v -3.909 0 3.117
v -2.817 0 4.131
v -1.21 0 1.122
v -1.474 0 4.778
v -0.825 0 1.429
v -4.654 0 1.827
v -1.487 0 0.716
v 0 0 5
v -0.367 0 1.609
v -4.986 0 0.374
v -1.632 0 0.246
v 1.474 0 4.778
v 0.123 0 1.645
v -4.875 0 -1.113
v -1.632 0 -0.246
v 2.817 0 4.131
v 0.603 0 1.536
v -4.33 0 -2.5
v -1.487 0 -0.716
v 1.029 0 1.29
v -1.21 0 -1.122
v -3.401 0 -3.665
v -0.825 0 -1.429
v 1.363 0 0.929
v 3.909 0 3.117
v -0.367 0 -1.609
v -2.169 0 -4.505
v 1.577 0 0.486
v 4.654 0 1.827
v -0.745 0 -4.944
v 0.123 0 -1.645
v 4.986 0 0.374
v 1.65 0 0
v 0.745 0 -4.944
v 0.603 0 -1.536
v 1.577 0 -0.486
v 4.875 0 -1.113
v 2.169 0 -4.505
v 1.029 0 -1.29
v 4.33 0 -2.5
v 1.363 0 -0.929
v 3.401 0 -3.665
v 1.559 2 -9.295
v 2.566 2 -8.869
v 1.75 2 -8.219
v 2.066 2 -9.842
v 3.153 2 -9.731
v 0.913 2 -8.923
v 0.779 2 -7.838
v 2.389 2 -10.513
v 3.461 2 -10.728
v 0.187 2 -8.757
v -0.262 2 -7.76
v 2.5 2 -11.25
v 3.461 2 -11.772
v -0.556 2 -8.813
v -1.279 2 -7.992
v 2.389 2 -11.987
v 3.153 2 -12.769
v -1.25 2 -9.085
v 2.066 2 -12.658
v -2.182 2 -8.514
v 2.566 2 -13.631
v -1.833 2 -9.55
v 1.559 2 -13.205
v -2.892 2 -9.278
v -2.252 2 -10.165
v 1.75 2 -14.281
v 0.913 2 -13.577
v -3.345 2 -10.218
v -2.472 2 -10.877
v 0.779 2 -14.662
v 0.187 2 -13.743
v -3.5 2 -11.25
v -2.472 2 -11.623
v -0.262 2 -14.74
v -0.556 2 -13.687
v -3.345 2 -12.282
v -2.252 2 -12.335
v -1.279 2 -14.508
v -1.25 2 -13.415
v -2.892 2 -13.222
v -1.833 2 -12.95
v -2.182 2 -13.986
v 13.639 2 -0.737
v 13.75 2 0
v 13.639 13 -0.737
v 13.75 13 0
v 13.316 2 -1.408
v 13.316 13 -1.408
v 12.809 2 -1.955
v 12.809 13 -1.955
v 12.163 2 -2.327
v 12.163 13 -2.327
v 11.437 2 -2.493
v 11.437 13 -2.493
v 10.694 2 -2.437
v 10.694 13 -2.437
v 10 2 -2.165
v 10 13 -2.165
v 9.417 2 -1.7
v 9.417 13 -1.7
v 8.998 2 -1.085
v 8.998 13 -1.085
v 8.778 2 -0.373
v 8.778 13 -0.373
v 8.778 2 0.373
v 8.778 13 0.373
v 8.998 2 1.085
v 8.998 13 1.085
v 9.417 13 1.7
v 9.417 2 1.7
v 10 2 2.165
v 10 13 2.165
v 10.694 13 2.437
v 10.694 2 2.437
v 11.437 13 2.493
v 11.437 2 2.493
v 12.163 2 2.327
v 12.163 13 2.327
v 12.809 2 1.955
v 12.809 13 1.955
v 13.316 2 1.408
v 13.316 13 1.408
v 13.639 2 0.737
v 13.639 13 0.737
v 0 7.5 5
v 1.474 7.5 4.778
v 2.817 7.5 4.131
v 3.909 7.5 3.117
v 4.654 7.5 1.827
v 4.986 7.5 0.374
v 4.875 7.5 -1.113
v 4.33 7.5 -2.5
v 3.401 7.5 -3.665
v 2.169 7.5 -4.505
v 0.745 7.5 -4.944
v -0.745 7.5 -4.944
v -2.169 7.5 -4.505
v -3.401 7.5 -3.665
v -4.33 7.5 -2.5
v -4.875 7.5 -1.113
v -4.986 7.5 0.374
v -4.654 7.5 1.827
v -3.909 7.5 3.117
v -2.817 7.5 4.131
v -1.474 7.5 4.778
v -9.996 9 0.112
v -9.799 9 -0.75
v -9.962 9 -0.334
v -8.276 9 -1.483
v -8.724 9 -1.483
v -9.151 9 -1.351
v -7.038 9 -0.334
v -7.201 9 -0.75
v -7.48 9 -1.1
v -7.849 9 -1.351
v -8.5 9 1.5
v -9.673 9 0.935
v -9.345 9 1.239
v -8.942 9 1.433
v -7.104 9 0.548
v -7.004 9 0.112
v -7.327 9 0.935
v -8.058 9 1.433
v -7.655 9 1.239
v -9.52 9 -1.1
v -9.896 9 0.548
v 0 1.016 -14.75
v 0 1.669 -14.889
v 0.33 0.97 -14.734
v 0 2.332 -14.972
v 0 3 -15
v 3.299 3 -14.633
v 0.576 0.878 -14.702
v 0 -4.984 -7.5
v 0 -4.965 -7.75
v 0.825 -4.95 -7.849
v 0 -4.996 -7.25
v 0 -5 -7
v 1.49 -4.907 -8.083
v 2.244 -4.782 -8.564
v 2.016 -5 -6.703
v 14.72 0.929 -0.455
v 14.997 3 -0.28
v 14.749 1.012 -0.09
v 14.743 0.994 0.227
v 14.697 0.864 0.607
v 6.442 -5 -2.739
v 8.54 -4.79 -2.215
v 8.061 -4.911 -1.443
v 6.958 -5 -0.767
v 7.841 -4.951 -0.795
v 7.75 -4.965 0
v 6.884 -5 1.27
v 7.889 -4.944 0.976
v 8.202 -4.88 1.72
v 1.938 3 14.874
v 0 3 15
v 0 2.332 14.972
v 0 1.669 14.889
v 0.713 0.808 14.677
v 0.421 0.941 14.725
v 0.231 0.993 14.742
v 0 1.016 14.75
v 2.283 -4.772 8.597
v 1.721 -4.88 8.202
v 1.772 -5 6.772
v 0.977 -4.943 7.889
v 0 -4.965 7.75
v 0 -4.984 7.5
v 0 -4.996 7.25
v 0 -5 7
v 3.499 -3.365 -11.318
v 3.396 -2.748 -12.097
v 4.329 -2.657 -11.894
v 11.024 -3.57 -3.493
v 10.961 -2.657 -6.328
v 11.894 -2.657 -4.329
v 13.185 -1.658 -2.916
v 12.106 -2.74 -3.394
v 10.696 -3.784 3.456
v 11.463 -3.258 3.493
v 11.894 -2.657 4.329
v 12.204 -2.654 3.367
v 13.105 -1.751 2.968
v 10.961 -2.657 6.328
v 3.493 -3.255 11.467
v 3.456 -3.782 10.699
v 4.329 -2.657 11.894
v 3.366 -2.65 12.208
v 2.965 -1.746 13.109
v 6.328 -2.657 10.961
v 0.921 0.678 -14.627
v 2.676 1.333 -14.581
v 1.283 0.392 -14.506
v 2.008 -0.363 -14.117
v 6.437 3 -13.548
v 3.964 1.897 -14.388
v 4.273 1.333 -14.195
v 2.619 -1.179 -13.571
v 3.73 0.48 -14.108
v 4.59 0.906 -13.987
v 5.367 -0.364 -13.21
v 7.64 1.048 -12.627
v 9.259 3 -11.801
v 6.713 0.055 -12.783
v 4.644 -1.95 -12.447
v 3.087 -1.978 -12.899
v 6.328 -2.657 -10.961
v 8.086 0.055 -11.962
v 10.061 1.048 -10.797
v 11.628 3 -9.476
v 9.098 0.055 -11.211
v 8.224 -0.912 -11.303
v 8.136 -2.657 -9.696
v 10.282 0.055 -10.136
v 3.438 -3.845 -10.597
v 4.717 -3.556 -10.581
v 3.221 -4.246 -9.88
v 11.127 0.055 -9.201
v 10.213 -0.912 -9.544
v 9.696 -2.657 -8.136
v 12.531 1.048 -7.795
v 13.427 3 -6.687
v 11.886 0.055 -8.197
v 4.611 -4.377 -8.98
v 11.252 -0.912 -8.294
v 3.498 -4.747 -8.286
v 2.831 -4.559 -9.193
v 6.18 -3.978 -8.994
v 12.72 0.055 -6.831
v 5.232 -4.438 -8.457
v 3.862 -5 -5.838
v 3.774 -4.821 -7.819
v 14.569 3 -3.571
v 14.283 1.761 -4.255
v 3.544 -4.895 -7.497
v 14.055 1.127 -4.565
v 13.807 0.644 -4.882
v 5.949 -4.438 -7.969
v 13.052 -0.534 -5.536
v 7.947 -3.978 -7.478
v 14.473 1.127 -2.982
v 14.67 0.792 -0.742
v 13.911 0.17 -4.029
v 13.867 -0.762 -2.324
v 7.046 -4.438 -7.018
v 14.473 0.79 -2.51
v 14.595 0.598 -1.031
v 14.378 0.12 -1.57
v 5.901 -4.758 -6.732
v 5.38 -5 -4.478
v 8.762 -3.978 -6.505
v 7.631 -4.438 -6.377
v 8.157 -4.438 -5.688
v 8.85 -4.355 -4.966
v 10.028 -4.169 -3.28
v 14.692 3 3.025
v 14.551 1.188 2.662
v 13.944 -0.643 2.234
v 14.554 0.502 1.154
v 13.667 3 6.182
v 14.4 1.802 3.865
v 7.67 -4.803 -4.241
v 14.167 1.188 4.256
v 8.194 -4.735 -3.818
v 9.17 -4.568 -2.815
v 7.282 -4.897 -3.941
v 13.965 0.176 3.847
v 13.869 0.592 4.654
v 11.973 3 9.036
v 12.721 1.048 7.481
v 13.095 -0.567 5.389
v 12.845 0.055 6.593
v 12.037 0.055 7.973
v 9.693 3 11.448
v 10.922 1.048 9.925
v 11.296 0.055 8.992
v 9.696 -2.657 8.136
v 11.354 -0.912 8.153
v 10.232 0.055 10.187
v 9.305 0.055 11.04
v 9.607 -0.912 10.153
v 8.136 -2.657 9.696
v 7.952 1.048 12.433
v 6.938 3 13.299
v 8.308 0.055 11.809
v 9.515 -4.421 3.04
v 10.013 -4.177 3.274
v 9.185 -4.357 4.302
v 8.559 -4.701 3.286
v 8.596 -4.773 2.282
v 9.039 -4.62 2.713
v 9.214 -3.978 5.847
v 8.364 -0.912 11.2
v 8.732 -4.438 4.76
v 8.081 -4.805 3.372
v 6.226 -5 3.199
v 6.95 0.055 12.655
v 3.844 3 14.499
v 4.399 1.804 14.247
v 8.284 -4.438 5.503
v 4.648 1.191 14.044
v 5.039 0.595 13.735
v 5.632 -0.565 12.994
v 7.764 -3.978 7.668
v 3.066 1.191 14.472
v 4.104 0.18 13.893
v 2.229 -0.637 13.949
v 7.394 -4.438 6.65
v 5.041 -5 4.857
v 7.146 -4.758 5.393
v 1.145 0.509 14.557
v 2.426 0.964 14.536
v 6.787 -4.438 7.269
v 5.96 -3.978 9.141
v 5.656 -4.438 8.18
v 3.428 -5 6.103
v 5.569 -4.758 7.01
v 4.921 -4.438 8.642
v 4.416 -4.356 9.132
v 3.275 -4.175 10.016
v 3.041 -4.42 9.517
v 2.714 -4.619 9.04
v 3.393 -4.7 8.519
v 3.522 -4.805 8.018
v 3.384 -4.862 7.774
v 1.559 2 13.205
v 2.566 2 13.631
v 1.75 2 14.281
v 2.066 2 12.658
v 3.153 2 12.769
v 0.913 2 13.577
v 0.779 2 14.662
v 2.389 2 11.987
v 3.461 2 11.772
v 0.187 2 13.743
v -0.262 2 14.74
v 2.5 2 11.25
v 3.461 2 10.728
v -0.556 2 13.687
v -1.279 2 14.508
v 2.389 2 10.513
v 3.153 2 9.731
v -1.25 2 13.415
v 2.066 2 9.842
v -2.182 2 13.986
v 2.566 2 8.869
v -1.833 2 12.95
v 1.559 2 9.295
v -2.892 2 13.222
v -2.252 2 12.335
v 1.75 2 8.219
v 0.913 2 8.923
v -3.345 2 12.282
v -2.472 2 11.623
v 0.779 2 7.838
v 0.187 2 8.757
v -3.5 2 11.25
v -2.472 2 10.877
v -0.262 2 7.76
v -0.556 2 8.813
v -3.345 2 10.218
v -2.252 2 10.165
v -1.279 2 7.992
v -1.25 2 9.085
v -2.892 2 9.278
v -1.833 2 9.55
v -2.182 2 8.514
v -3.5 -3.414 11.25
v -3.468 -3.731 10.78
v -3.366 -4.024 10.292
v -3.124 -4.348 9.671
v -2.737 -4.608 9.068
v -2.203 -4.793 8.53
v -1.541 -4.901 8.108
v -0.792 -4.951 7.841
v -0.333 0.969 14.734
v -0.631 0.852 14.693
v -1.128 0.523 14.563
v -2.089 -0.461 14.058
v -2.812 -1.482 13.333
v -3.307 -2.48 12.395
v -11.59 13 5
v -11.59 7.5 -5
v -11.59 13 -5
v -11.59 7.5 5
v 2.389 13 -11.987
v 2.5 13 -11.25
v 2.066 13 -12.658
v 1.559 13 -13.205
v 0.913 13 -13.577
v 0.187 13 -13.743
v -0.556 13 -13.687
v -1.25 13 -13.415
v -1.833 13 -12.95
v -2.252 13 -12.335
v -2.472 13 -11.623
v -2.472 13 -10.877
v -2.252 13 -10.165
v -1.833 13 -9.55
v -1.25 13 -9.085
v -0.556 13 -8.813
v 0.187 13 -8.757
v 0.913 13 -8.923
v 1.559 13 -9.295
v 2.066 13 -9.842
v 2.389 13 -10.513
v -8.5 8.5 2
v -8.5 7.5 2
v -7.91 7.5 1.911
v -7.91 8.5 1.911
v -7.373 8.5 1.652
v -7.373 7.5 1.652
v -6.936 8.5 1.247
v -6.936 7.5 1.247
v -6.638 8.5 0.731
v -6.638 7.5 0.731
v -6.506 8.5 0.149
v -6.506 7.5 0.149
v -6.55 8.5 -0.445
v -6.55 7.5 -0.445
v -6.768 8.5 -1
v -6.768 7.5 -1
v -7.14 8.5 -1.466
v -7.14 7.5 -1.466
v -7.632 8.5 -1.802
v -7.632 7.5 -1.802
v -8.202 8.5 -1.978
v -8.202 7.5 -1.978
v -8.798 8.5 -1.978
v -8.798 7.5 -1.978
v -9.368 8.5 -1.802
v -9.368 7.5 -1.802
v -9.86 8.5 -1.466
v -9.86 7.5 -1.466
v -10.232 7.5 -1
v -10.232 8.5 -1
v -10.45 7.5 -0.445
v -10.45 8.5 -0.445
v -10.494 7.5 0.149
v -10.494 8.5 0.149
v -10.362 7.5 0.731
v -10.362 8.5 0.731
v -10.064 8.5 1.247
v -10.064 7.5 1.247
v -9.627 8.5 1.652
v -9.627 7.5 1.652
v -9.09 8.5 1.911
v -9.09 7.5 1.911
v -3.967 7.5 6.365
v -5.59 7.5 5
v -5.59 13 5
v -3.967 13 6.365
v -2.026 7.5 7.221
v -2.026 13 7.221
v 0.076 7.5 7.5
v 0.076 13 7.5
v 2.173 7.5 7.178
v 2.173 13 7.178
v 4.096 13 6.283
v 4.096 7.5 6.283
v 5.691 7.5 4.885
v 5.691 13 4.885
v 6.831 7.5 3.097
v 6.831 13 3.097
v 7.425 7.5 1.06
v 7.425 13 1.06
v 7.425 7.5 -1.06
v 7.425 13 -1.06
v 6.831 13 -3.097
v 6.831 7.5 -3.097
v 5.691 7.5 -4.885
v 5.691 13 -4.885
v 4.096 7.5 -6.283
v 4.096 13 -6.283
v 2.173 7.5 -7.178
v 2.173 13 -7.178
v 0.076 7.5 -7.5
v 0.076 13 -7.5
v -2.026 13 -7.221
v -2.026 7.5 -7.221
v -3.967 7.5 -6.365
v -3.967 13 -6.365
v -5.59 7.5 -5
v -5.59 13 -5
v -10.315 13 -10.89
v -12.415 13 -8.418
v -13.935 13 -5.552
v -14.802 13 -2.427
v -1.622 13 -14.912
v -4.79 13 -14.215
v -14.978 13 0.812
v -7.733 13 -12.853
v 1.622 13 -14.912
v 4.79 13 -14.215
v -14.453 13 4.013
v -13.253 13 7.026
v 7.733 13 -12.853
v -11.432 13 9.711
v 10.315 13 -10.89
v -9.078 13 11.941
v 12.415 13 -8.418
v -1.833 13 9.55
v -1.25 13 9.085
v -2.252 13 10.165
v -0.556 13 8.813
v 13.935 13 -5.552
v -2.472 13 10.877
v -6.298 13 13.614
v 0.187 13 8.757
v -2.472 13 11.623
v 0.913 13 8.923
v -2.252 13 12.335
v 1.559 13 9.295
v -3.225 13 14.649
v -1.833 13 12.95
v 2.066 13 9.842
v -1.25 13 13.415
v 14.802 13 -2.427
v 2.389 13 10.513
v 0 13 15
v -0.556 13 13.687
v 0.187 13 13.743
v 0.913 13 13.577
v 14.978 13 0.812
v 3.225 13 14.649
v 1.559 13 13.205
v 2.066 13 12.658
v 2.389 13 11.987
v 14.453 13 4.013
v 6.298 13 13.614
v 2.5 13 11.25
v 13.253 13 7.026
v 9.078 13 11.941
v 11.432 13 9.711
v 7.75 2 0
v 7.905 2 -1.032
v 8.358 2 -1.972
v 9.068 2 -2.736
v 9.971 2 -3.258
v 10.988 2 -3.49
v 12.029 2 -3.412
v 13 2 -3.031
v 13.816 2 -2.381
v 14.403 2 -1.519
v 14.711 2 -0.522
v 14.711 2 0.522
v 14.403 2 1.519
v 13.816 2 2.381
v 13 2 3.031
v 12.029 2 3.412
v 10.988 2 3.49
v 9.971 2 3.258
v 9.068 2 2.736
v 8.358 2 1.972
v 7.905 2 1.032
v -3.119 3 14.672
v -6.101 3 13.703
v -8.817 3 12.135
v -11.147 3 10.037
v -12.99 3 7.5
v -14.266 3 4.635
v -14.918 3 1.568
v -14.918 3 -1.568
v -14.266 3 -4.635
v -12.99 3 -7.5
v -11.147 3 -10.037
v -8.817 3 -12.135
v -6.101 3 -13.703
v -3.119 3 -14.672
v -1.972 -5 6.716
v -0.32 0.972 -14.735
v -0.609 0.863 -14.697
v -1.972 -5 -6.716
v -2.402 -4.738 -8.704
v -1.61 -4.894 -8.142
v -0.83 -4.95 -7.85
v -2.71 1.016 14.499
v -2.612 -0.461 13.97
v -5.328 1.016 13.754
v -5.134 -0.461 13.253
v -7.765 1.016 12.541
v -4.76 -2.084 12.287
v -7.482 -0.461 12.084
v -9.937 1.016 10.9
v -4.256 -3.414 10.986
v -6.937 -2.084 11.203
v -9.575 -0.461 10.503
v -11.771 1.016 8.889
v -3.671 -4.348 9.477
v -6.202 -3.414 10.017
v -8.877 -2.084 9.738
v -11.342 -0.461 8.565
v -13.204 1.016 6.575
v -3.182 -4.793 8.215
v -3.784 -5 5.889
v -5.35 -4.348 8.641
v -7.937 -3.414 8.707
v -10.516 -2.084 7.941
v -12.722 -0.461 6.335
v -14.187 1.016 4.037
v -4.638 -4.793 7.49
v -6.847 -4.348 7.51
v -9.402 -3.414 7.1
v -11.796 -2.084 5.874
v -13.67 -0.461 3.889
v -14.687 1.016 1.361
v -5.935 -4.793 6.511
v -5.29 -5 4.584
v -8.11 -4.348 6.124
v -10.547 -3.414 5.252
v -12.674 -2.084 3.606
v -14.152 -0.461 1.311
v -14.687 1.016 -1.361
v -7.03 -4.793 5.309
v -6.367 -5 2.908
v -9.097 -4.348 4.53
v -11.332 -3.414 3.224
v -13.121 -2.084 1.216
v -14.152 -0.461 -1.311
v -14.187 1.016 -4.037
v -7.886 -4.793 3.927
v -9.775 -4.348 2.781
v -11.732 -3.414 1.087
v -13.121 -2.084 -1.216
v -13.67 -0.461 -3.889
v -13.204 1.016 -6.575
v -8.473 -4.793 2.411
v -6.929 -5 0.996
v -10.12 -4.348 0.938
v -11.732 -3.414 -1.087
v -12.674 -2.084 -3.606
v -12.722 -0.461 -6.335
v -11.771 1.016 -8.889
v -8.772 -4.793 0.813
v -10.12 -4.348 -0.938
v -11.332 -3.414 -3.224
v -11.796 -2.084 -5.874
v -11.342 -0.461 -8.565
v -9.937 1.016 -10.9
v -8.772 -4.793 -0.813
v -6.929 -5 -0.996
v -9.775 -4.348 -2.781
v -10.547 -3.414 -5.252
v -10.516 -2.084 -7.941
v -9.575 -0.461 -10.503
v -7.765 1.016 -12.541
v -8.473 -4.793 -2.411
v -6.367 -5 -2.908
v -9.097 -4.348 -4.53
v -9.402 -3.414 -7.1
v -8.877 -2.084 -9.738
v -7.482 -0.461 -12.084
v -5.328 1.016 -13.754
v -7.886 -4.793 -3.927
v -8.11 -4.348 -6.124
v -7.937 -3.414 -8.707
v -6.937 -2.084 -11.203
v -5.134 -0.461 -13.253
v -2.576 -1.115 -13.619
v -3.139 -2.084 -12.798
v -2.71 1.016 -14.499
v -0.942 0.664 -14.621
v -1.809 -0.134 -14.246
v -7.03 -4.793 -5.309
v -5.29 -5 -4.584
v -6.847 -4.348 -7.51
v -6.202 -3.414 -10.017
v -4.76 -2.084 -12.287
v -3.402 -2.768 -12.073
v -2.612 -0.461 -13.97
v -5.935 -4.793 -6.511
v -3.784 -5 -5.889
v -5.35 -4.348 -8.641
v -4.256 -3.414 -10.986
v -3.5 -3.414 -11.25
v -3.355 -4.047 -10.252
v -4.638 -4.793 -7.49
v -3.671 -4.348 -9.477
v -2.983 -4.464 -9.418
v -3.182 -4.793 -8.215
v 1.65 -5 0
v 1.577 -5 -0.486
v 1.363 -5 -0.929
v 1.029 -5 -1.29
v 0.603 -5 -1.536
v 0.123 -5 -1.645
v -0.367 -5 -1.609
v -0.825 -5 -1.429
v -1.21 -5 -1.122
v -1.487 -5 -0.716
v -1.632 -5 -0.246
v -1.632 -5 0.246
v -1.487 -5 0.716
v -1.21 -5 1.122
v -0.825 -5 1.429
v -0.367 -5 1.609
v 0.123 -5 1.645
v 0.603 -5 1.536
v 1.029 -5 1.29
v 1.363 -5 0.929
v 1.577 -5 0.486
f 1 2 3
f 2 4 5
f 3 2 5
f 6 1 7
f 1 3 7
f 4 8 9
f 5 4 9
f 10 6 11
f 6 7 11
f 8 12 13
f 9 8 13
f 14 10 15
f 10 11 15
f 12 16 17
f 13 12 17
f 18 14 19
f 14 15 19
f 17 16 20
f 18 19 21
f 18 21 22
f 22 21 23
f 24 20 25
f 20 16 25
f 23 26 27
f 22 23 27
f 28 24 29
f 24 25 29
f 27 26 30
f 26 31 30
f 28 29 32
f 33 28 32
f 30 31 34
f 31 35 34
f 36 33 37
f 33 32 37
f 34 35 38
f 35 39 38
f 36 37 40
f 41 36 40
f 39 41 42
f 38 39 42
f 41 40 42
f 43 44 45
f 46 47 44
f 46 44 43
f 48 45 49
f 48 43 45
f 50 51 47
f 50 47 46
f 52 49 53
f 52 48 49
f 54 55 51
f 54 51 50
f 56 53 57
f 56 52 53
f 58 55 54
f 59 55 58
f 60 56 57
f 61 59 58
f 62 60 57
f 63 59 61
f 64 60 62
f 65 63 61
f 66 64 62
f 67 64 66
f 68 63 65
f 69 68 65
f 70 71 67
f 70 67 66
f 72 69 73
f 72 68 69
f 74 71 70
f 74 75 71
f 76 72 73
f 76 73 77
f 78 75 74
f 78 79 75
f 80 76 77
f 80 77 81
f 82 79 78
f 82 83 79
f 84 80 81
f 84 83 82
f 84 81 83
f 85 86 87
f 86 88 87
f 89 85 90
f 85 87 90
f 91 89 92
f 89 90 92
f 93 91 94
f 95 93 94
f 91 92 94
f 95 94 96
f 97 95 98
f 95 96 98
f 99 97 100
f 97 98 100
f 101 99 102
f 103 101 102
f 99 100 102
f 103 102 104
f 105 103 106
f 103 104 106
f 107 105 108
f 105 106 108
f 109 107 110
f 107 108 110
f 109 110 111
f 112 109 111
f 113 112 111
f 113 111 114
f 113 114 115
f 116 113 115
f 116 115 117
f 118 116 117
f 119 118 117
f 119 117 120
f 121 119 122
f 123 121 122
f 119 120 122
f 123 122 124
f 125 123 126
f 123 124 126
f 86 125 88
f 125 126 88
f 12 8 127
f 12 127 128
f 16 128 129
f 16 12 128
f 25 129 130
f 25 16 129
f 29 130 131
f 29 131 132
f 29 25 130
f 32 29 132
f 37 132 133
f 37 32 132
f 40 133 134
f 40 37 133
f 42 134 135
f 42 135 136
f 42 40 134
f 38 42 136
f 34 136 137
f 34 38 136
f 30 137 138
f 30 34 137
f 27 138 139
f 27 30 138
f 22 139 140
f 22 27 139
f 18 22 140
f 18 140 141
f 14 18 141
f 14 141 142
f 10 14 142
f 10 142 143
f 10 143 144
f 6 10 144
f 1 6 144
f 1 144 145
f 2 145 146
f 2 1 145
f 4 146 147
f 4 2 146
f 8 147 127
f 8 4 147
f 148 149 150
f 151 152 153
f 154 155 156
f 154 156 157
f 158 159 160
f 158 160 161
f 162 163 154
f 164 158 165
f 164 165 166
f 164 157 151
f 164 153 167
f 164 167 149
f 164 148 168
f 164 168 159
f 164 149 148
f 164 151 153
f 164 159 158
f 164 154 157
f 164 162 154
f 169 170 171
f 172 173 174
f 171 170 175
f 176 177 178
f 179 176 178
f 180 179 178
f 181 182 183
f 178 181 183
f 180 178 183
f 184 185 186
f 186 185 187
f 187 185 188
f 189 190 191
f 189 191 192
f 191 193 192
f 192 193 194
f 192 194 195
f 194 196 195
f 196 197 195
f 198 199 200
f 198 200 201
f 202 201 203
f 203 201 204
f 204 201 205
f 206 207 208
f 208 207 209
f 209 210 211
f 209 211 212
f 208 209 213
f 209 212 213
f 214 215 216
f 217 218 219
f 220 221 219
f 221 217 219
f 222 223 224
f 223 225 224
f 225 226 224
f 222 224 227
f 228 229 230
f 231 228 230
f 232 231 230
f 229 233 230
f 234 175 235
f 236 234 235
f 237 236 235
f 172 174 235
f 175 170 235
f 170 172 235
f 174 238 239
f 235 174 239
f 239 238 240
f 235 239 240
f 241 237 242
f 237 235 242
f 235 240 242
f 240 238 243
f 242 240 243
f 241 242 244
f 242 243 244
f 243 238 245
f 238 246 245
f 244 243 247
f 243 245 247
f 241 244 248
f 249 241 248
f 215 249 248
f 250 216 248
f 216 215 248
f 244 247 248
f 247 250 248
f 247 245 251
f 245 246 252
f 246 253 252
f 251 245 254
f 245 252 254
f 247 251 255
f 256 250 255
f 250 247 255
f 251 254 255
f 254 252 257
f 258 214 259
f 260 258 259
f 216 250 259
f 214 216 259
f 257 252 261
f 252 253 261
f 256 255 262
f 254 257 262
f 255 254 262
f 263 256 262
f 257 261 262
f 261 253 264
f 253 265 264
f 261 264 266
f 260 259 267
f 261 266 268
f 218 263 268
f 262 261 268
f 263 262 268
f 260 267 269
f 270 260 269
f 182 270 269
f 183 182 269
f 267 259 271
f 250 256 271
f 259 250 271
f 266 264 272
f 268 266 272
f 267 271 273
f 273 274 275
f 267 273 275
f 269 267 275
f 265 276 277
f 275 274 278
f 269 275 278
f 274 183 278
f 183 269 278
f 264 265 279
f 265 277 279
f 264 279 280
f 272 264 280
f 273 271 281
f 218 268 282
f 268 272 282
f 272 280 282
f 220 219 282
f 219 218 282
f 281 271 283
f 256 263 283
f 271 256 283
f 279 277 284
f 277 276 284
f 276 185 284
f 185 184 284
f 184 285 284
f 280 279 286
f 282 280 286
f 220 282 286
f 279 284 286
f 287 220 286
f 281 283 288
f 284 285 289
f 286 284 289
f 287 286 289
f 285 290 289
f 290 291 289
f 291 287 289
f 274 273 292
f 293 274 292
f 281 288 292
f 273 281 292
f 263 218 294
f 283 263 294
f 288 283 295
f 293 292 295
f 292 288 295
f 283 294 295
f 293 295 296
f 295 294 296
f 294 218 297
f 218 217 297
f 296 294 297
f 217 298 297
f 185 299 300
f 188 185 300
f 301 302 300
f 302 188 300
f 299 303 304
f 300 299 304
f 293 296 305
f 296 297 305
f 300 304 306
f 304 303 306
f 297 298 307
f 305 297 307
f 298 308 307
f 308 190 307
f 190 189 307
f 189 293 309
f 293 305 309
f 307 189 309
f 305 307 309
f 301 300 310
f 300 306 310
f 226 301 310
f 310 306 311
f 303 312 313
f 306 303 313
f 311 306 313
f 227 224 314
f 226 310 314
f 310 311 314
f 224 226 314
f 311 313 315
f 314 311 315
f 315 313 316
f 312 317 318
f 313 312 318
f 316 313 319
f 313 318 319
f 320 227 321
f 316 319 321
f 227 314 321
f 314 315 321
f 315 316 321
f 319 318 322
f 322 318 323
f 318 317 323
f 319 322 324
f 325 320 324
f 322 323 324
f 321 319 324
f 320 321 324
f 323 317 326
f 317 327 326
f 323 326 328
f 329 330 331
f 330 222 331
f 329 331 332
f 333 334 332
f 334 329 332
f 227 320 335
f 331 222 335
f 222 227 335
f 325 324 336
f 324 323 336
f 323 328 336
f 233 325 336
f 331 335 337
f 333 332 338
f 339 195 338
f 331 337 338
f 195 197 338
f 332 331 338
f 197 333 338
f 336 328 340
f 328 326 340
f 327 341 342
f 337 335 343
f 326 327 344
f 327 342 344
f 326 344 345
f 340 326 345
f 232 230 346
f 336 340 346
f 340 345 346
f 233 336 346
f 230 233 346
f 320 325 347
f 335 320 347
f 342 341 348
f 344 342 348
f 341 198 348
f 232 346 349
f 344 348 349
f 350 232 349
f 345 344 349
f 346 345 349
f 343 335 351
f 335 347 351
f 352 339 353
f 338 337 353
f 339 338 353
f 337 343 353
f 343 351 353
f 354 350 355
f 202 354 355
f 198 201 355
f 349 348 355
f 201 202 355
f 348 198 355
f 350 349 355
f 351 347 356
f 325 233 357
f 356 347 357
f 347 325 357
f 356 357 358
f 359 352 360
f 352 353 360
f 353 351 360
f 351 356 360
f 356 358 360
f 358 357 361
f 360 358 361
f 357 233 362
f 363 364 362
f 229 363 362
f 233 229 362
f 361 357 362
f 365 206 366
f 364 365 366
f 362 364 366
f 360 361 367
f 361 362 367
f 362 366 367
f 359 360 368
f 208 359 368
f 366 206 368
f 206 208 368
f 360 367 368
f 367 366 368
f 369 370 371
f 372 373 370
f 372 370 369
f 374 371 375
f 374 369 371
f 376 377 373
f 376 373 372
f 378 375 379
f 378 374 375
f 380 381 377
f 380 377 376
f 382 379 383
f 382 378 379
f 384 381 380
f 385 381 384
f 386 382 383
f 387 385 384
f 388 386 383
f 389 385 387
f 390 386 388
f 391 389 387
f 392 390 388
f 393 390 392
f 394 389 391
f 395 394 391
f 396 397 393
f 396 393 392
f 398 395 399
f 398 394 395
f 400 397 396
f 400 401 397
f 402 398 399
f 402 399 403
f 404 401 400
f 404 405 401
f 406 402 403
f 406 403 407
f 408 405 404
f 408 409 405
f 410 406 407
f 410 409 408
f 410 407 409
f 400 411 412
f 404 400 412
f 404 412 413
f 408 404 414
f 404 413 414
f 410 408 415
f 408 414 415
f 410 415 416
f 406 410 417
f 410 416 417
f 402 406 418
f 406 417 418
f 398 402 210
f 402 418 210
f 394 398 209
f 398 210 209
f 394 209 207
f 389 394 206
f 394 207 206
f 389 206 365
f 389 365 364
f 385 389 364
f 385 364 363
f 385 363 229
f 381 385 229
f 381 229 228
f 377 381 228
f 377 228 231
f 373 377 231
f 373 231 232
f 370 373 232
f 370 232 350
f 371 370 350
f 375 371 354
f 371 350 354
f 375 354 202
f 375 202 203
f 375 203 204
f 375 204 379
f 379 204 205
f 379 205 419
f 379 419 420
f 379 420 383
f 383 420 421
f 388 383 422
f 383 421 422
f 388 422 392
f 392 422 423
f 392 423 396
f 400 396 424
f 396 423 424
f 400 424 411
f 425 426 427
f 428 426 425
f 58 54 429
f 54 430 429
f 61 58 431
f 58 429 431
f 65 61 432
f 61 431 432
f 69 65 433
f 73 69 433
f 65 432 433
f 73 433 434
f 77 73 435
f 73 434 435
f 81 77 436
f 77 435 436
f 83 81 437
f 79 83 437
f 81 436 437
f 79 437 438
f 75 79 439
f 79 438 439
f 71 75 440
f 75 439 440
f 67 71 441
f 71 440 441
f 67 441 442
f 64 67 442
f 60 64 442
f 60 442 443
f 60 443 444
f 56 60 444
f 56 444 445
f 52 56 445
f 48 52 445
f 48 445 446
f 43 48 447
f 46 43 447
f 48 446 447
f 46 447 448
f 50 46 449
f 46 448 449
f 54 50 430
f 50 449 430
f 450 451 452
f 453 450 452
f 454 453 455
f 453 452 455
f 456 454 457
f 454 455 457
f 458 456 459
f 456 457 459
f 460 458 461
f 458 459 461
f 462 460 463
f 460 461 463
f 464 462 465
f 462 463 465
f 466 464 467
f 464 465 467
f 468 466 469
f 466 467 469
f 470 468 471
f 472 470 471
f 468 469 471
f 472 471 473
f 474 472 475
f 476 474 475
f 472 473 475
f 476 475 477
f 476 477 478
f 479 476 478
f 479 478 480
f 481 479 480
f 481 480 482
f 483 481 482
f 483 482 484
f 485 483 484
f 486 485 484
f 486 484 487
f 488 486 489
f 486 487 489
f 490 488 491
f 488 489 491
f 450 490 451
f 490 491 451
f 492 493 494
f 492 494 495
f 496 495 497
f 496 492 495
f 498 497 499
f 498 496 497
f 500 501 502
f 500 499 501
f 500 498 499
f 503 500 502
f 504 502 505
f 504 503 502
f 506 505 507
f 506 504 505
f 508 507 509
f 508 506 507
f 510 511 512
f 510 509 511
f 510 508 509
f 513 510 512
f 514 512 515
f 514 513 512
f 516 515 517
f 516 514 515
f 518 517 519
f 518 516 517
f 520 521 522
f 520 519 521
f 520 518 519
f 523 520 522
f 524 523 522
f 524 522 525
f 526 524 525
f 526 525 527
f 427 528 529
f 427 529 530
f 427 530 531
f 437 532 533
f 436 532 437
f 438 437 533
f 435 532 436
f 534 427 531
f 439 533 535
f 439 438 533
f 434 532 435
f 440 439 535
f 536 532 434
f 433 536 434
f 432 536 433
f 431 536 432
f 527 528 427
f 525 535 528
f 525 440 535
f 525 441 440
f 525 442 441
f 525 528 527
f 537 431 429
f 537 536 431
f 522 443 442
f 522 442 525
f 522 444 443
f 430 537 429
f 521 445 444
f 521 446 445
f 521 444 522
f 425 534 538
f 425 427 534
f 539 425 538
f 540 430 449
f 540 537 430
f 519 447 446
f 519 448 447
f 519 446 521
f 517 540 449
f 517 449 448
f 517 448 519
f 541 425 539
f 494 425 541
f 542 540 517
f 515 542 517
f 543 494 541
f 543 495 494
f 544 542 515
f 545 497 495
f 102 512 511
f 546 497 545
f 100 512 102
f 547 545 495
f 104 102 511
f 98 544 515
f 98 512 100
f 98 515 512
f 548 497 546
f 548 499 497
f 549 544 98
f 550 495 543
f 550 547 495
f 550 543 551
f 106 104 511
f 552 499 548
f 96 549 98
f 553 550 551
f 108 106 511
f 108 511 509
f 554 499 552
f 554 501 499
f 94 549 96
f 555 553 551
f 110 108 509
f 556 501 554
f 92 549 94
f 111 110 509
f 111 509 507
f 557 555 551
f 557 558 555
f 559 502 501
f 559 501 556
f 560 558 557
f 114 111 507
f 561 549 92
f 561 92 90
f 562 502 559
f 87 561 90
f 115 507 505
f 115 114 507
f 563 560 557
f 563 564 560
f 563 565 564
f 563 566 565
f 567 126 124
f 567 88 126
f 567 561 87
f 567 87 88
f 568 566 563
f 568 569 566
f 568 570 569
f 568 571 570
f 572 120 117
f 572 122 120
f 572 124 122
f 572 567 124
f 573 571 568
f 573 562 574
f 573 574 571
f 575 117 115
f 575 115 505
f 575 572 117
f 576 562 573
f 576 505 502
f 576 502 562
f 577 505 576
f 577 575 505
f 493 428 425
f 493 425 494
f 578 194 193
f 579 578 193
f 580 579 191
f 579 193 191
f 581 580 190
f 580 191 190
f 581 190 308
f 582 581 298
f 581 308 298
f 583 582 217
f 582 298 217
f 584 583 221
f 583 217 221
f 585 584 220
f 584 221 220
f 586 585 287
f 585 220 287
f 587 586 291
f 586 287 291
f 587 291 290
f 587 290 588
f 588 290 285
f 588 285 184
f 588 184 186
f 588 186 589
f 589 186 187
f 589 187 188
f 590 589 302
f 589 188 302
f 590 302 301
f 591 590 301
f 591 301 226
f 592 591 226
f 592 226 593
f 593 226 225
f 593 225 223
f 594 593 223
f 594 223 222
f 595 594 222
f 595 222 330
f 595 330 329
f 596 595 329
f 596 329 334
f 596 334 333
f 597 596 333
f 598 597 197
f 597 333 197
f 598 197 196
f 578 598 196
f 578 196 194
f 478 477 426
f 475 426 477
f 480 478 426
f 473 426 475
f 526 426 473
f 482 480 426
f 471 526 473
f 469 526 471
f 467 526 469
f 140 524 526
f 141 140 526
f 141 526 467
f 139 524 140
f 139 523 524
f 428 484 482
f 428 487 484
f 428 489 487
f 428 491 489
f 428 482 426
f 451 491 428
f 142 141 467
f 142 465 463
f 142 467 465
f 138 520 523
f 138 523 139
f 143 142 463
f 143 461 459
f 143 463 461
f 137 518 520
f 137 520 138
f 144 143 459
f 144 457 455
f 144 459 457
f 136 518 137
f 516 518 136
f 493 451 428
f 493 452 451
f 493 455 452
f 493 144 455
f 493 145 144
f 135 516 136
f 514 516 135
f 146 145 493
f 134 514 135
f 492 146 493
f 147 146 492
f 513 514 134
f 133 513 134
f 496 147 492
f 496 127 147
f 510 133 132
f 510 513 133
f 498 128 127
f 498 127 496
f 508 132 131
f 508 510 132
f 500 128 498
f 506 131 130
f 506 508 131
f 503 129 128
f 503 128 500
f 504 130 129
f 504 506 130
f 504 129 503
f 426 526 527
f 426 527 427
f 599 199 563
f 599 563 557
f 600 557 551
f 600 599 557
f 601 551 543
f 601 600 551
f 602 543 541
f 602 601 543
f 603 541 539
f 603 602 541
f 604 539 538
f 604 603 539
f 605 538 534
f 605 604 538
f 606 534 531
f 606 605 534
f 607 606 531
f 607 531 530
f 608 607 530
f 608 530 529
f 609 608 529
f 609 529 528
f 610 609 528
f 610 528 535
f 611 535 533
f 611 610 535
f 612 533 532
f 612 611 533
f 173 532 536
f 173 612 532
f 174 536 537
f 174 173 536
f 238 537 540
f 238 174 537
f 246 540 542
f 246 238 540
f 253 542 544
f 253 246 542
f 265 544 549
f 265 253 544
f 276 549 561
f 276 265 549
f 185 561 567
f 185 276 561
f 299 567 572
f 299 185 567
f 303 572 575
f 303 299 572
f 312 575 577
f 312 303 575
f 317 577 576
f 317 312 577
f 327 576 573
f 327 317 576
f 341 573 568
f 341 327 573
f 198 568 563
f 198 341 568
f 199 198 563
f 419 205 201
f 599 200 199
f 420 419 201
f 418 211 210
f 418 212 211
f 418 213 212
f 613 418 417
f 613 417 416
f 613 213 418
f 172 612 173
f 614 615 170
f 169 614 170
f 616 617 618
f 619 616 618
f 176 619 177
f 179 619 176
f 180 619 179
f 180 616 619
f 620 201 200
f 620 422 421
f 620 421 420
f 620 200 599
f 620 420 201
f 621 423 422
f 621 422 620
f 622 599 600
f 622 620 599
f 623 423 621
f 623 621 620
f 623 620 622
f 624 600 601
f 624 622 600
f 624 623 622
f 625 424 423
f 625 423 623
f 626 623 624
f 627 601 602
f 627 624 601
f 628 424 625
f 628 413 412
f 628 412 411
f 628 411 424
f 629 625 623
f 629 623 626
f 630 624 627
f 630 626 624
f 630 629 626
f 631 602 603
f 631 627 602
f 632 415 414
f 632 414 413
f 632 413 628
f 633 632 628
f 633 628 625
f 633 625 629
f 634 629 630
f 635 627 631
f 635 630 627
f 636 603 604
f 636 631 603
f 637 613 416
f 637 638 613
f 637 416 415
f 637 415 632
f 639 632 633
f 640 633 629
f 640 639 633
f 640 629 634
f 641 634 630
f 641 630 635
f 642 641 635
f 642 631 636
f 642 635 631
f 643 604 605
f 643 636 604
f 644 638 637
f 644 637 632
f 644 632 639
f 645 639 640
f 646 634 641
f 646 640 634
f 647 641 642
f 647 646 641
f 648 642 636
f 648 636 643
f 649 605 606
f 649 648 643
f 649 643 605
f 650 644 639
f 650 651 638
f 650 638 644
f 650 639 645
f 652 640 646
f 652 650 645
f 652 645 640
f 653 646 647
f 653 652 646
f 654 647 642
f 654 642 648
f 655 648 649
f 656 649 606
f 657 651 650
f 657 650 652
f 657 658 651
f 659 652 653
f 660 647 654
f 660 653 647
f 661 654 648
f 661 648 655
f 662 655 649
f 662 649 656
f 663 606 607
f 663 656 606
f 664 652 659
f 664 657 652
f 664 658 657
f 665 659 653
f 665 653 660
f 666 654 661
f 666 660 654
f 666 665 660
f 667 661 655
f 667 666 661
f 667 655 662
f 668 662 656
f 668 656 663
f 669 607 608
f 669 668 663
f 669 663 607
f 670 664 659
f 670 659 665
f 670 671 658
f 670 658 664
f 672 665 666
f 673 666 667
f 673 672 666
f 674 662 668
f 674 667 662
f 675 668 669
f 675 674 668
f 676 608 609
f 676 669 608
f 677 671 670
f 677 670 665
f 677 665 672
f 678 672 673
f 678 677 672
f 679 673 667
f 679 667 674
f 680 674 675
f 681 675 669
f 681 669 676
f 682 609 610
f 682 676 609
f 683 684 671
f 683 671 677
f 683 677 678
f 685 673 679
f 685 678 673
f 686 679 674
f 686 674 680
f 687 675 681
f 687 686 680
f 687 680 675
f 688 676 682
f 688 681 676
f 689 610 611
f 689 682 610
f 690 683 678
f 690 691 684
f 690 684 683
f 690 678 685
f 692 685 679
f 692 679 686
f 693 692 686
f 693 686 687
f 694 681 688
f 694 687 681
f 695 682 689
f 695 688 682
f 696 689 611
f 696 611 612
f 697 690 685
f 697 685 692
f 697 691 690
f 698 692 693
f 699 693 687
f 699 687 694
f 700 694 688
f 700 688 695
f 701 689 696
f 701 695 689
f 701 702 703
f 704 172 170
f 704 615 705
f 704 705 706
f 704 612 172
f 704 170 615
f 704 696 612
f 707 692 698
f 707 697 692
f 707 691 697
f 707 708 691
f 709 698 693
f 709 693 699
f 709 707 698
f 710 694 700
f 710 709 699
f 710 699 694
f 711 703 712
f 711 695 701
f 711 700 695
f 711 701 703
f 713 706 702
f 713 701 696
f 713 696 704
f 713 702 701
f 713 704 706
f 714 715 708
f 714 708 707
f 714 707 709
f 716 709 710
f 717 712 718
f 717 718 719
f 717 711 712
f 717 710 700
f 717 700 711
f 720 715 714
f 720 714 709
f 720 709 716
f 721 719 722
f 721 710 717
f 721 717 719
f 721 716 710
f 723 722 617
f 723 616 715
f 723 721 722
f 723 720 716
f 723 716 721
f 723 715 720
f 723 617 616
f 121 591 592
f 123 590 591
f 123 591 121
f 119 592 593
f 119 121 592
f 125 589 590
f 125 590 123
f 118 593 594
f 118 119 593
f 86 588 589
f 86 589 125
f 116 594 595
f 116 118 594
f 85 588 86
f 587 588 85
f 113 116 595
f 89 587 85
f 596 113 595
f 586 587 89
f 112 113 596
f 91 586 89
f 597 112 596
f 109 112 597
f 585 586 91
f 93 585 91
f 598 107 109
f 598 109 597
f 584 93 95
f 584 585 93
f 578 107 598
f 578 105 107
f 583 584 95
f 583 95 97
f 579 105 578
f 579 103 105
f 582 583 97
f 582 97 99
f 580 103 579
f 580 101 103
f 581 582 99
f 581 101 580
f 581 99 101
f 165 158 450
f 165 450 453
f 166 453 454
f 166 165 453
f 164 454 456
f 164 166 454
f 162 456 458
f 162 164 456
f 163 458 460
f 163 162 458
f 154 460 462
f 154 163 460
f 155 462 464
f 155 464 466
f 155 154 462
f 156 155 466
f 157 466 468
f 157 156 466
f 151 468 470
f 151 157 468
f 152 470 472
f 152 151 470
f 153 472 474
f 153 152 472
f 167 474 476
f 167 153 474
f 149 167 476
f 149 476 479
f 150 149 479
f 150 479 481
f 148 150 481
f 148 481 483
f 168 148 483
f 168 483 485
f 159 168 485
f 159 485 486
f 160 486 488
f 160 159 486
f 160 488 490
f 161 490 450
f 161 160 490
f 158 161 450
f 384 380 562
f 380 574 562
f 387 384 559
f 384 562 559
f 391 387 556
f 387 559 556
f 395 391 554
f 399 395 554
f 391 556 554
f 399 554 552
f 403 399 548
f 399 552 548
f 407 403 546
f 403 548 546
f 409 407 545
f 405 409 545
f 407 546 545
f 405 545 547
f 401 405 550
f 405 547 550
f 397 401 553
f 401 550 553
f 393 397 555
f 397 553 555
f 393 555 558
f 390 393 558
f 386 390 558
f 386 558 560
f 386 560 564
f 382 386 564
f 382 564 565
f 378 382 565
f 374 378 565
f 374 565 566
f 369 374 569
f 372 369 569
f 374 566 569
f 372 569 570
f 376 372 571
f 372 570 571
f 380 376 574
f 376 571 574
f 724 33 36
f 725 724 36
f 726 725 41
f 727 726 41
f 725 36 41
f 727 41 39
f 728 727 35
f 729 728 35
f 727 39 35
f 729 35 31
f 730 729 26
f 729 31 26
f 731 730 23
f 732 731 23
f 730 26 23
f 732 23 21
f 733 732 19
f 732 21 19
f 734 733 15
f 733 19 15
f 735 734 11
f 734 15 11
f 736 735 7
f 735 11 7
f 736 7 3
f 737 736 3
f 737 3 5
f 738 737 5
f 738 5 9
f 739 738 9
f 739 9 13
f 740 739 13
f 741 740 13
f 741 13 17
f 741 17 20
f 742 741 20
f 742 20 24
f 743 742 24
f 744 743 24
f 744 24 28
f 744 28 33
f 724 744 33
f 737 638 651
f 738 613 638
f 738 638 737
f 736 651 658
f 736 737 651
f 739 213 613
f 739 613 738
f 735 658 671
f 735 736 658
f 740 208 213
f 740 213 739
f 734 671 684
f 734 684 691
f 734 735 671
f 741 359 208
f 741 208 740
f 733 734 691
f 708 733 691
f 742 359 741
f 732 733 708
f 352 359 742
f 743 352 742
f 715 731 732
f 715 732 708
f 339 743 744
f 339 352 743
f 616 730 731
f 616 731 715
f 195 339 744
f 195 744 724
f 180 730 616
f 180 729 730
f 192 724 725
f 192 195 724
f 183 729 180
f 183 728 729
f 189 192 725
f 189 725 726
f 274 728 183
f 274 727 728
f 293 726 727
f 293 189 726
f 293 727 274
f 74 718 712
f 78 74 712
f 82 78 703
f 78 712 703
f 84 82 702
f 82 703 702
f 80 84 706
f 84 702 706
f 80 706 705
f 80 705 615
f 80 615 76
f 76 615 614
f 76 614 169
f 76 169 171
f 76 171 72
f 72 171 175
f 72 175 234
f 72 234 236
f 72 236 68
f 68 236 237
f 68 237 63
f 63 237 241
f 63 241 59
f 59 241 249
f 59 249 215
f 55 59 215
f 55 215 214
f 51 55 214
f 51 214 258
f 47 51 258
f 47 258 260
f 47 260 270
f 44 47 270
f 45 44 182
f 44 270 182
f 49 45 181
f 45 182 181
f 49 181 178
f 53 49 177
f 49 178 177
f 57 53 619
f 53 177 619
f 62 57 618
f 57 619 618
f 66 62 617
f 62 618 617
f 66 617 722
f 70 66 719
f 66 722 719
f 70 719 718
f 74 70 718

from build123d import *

# Parameters (mm, degrees)
SKETCH1_R             = 15
SKETCH1_R_2           = 5
BOSS_EXTRUDE1_DEPTH   = 7.5
SKETCH2_R             = 15
SKETCH2_R_2           = 7.5
BOSS_EXTRUDE2_DEPTH   = 5.5
BOSS_EXTRUDE3_START   = 5
SKETCH3_R             = 15
BOSS_EXTRUDE3_DEPTH   = 5
M4X0_7_TAPPED_HOLE1_D = 3.3
FILLET1_R             = 8
HOLE1_D               = 5
HOLE1_DEPTH           = 18
HOLE1_CBORE_D         = 7
HOLE1_CBORE_DEPTH     = 7
HOLE1_TIP             = 1.502151548
CUT_EXTRUDE1_START    = -5.5
CUT_EXTRUDE1_DEPTH    = 5.5
SKETCH10_R            = 2
BOSS_EXTRUDE4_DEPTH   = 1.5
CHAMFER1_SIZE         = 0.5


with BuildPart() as part:
    # Sketch1 → Boss-Extrude1 (new body)
    with BuildSketch(Plane(origin=(0, 0, 0), x_dir=(1, 0, 0), z_dir=(0, 1, 0))):
        with Locations(Location((0, 0, 0), (0, 0, 270))):
            Circle(SKETCH1_R)
        with Locations(Location((0, 0, 0), (0, 0, 270))):
            Circle(SKETCH1_R_2, mode=Mode.SUBTRACT)
    extrude(amount=BOSS_EXTRUDE1_DEPTH)

    # Sketch2 → Boss-Extrude2 (add)
    with BuildSketch(Plane(origin=(0, 7.5, 0), x_dir=(1, 0, 0), z_dir=(0, 1, 0))):
        with Locations(Location((0, 0, 0), (0, 0, 270))):
            Circle(SKETCH2_R)
        with Locations(Location((0, 0, 0), (0, 0, 270))):
            Circle(SKETCH2_R_2, mode=Mode.SUBTRACT)
    extrude(amount=BOSS_EXTRUDE2_DEPTH)

    # Sketch3 → Boss-Extrude3 (add)
    with BuildSketch(Plane.XZ.offset(BOSS_EXTRUDE3_START)):
        with Locations(Location((0, 0, 0), (0, 0, 270))):
            Circle(SKETCH3_R)
    extrude(amount=-BOSS_EXTRUDE3_DEPTH)

    # M4x0.7 Tapped Hole1 (through all)
    with Locations(Plane(origin=(0, -5, 0), x_dir=(-1, 0, 0), z_dir=(0, -1, 0))):
        with Locations((0, 0)):
            Hole(M4X0_7_TAPPED_HOLE1_D / 2)

    # Fillet1
    fillet1_edges = [part.edges().sort_by_distance(p)[0] for p in [
        (0, -5, 15),
    ]]
    fillet(fillet1_edges, radius=FILLET1_R)

    # Hole1
    with Locations(Plane(origin=(0, -5, 0), x_dir=(-1, 0, 0), z_dir=(0, -1, 0))):
        with Locations((0, 11.25), (-11.25, 0), (0, -11.25)):
            CounterBoreHole(HOLE1_D / 2, HOLE1_CBORE_D / 2, HOLE1_CBORE_DEPTH, depth=HOLE1_DEPTH)
            with Locations((0, 0, -(HOLE1_DEPTH + HOLE1_TIP / 2))):  # 118° drill point
                Cone(0, HOLE1_D / 2, HOLE1_TIP, mode=Mode.SUBTRACT)

    # Sketch9 → Cut-Extrude1 (cut)
    with BuildSketch(Plane(origin=(0, 13, 0), x_dir=(1, 0, 0), z_dir=(0, 1, 0)).offset(CUT_EXTRUDE1_START)):
        with BuildLine():
            Line((-5.590169944, 5), (-11.590169944, 5))
            Line((-11.590169944, 5), (-11.590169944, -5))
            Line((-11.590169944, -5), (-5.590169944, -5))
            ThreePointArc((-5.590169944, -5), (-7.5, 0), (-5.590169944, 5))
        make_face()
    extrude(amount=CUT_EXTRUDE1_DEPTH, mode=Mode.SUBTRACT)

    # Sketch10 → Boss-Extrude4 (add)
    with BuildSketch(Plane(origin=(0, 7.5, 0), x_dir=(1, 0, 0), z_dir=(0, 1, 0))):
        with Locations(Location((-8.5, 0, 0), (0, 0, 270))):
            Circle(SKETCH10_R)
    extrude(amount=BOSS_EXTRUDE4_DEPTH)

    # Chamfer1
    chamfer1_edges = [part.edges().sort_by_distance(p)[0] for p in [
        (-8.5, 9, -2),
    ]]
    chamfer(chamfer1_edges, length=CHAMFER1_SIZE)


solid = part.part
